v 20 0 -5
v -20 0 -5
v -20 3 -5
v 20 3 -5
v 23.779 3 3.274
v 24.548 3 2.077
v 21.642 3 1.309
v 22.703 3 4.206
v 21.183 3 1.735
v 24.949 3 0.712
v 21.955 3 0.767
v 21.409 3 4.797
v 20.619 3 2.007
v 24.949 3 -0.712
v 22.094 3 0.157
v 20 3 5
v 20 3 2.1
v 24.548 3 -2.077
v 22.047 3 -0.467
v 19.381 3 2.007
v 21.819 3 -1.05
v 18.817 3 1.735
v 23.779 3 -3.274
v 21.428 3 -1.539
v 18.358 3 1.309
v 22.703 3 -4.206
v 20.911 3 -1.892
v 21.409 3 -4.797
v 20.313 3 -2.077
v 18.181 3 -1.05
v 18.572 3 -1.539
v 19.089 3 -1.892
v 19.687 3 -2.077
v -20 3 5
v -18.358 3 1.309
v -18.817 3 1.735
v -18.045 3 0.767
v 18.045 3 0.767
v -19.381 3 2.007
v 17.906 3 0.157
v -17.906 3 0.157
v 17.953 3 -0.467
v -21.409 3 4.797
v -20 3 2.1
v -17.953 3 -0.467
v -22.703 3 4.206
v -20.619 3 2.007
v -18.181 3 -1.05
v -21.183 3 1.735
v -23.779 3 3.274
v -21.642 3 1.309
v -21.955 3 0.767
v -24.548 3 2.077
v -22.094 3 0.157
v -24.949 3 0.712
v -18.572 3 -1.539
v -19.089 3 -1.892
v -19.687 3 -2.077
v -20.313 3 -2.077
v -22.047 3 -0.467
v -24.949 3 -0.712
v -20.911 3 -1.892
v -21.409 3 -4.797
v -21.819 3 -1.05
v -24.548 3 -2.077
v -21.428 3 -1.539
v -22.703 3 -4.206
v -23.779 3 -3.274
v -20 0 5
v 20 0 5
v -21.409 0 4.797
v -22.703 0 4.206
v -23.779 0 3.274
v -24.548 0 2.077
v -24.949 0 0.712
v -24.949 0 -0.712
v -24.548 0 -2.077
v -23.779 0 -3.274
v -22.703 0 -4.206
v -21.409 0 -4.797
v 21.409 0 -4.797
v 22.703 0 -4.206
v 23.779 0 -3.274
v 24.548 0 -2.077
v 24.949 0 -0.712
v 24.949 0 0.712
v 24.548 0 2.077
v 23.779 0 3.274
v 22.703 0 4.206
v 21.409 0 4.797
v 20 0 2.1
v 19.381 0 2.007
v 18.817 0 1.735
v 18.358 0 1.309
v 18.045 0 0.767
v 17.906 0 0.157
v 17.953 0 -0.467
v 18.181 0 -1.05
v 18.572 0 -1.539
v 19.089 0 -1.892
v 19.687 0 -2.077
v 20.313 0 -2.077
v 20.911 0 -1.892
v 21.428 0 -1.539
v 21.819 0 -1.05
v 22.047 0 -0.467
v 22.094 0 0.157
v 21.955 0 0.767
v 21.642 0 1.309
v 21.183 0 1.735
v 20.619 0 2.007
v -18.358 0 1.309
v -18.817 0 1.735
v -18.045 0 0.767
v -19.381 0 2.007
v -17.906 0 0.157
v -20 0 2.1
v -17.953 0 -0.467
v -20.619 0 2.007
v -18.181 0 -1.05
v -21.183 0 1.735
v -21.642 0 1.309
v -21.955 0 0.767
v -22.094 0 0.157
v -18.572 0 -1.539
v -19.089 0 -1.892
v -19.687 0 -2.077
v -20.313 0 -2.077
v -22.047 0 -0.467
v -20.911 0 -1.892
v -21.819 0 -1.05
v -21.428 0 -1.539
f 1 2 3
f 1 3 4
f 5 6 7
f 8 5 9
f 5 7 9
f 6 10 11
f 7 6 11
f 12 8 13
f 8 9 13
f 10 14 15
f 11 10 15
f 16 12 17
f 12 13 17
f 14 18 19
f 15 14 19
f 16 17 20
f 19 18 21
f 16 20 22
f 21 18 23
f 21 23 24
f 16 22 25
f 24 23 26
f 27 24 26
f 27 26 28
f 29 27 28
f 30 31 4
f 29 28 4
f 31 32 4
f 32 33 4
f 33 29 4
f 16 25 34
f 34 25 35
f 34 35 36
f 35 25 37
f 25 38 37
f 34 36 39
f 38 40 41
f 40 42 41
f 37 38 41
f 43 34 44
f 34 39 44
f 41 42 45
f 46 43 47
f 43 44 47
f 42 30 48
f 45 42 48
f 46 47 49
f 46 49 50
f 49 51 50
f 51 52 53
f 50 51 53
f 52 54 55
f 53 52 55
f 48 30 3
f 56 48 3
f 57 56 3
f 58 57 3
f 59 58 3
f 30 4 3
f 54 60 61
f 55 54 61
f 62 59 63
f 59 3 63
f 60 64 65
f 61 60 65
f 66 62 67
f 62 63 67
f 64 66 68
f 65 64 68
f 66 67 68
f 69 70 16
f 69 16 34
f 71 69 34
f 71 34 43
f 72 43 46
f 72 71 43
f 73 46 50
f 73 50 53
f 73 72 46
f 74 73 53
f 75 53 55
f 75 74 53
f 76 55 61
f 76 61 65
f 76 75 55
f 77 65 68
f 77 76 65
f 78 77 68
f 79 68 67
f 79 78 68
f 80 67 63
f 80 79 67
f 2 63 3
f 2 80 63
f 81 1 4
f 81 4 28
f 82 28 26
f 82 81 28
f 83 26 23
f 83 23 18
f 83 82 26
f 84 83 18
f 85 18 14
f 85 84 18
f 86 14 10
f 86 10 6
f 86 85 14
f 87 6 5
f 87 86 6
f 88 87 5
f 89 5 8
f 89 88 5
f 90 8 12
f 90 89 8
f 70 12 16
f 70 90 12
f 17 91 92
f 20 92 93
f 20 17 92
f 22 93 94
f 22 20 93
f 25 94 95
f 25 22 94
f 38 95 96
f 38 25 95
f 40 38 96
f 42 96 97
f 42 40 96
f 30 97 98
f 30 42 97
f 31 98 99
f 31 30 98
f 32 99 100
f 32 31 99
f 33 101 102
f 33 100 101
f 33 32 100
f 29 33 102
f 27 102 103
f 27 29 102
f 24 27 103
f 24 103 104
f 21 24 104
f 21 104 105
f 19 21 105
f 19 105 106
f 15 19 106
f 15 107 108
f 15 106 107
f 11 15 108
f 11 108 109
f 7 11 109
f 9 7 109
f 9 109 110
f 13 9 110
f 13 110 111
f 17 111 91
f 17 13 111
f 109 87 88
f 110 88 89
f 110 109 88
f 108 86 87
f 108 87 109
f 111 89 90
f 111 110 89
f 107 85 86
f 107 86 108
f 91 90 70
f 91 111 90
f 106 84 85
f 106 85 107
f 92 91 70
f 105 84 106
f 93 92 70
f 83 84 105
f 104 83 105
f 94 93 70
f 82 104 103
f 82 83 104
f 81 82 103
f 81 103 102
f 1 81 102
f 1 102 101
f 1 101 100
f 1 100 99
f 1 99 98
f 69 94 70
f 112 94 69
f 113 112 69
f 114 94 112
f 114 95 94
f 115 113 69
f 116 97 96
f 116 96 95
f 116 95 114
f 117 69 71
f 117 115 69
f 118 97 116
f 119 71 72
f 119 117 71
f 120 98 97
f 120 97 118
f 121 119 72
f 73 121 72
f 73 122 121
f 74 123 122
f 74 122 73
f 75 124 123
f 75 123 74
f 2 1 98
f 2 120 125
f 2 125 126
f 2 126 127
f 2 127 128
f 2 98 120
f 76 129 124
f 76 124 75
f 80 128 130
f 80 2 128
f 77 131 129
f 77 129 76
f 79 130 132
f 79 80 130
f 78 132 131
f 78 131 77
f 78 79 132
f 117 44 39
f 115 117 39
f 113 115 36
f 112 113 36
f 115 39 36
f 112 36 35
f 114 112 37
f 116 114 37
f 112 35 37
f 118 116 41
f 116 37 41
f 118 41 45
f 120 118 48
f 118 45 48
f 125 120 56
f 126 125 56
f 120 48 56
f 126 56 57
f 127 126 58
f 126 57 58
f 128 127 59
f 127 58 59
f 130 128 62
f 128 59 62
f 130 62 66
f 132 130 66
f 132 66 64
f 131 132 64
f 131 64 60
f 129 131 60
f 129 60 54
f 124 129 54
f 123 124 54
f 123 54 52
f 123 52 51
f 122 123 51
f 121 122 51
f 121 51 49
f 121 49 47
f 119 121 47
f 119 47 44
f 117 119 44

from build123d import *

# Parameters (mm, degrees)
BOSS_EXTRUDE2_DEPTH = 3
SKETCH3_R           = 2.1
CUT_EXTRUDE3_DEPTH  = 4


with BuildPart() as part:
    # Sketch1 → Boss-Extrude2 (new body)
    with BuildSketch(Plane(origin=(0, 0, 0), x_dir=(1, 0, 0), z_dir=(0, 1, 0))):
        with BuildLine():
            Line((20, -5), (-20, -5))
            ThreePointArc((-20, -5), (-25, 0), (-20, 5))
            Line((-20, 5), (20, 5))
            ThreePointArc((20, 5), (25, 0), (20, -5))
        make_face()
    extrude(amount=BOSS_EXTRUDE2_DEPTH)

    # Sketch3 → Cut-Extrude3 (cut, through all)
    with BuildSketch(Plane(origin=(0, 3, 0), x_dir=(1, 0, 0), z_dir=(0, 1, 0))):
        with Locations(Location((-20, 0, 0), (0, 0, 270))):  # turned: the seam where the file's is
            Circle(SKETCH3_R)
    cut_extrude3 = extrude(amount=-CUT_EXTRUDE3_DEPTH, mode=Mode.SUBTRACT)

    # Mirror1: Cut-Extrude3 across plane
    add(cut_extrude3.mirror(Plane(origin=(0, 0, 0), x_dir=(0, 0, 1), z_dir=(1, 0, 0))), mode=Mode.SUBTRACT)


solid = part.part
